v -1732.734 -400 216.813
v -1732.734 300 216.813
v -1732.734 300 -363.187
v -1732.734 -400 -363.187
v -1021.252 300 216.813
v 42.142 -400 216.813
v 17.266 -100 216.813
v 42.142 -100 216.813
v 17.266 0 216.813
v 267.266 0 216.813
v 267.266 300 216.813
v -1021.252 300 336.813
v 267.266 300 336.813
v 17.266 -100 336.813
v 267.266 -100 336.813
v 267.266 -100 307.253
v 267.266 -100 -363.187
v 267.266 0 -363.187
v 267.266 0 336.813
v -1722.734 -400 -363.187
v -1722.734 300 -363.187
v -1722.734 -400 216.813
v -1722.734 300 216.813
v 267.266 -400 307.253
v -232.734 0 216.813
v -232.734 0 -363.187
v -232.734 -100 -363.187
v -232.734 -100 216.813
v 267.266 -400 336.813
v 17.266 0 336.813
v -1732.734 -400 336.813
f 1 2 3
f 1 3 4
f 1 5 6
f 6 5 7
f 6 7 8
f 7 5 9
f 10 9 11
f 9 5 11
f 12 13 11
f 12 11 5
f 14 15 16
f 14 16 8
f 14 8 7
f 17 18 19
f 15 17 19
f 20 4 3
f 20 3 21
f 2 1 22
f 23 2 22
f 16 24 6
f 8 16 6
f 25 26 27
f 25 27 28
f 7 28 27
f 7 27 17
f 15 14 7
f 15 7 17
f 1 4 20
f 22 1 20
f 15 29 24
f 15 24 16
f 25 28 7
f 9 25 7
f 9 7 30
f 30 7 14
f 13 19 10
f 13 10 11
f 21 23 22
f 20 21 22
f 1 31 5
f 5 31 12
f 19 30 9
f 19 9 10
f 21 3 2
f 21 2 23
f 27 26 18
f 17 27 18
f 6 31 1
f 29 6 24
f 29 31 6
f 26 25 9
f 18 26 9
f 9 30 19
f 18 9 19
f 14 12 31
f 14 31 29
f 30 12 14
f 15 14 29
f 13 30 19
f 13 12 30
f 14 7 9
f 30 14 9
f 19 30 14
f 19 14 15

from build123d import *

# Parameters (mm, degrees)
F0_W      = 500
F0_H      = 700
F1_DEPTH  = 100
F2_W      = 250
F2_H      = 120
F3_DEPTH  = 231
F5_DEPTH  = 120
F6_W      = 10
F6_H      = 700
F7_DEPTH  = 580
F9_DEPTH  = 300
F11_DEPTH = 280


with BuildPart() as f1:
    # F0 (on Front) → F1 (new body)
    with BuildSketch(Plane.XZ):
        with Locations((17.2661517365, -13.1869101897)):
            Rectangle(F0_W, F0_H)
    extrude(amount=F1_DEPTH)

    # F2 (on face) → F3 (cut)
    with BuildSketch(Plane.XZ.offset(100)):
        with Locations((-107.7338482635, 276.8130898103)):
            Rectangle(F2_W, F2_H)
    extrude(amount=-F3_DEPTH, mode=Mode.SUBTRACT)


with BuildPart() as f5:
    # F4 (on face) → F5 (new body, through all)
    with BuildSketch(Plane.XY.offset(336.8130898103)):
        Polygon((17.2661517365, 0), (267.2661517365, 0), (267.2661517365, 300), (-1732.7338482635, 300), (-1732.7338482635, -400), (267.2661517365, -400), (267.2661517365, -100), (17.2661517365, -100), align=None)
    extrude(amount=-F5_DEPTH)

    # F8 (on face) → F9 (cut, through all)
    with BuildSketch(Plane.XZ.offset(400)):
        Polygon((267.2661517365, 307.2530031204), (42.1416759491, 216.8130898103), (267.2661517365, 216.8130898103), align=None)
    extrude(amount=-F9_DEPTH, mode=Mode.SUBTRACT)

    # F10 (on face) → F11 (cut)
    with BuildSketch(Plane.XY.offset(336.8130898103)):
        Polygon((-1732.7338482635, 300), (-1732.7338482635, -400), (-1021.2520360947, 300), align=None)
    extrude(amount=-F11_DEPTH, mode=Mode.SUBTRACT)


with BuildPart() as f7:
    # F6 (on face) → F7 (new body, through all)
    with BuildSketch(Plane(origin=(0, 0, 216.8130898103), x_dir=(1, 0, 0), z_dir=(0, 0, -1))):
        with Locations((-1727.7338482635, 50)):
            Rectangle(F6_W, F6_H)
    extrude(amount=F7_DEPTH)


solid = Compound([f1.part, f5.part, f7.part])
